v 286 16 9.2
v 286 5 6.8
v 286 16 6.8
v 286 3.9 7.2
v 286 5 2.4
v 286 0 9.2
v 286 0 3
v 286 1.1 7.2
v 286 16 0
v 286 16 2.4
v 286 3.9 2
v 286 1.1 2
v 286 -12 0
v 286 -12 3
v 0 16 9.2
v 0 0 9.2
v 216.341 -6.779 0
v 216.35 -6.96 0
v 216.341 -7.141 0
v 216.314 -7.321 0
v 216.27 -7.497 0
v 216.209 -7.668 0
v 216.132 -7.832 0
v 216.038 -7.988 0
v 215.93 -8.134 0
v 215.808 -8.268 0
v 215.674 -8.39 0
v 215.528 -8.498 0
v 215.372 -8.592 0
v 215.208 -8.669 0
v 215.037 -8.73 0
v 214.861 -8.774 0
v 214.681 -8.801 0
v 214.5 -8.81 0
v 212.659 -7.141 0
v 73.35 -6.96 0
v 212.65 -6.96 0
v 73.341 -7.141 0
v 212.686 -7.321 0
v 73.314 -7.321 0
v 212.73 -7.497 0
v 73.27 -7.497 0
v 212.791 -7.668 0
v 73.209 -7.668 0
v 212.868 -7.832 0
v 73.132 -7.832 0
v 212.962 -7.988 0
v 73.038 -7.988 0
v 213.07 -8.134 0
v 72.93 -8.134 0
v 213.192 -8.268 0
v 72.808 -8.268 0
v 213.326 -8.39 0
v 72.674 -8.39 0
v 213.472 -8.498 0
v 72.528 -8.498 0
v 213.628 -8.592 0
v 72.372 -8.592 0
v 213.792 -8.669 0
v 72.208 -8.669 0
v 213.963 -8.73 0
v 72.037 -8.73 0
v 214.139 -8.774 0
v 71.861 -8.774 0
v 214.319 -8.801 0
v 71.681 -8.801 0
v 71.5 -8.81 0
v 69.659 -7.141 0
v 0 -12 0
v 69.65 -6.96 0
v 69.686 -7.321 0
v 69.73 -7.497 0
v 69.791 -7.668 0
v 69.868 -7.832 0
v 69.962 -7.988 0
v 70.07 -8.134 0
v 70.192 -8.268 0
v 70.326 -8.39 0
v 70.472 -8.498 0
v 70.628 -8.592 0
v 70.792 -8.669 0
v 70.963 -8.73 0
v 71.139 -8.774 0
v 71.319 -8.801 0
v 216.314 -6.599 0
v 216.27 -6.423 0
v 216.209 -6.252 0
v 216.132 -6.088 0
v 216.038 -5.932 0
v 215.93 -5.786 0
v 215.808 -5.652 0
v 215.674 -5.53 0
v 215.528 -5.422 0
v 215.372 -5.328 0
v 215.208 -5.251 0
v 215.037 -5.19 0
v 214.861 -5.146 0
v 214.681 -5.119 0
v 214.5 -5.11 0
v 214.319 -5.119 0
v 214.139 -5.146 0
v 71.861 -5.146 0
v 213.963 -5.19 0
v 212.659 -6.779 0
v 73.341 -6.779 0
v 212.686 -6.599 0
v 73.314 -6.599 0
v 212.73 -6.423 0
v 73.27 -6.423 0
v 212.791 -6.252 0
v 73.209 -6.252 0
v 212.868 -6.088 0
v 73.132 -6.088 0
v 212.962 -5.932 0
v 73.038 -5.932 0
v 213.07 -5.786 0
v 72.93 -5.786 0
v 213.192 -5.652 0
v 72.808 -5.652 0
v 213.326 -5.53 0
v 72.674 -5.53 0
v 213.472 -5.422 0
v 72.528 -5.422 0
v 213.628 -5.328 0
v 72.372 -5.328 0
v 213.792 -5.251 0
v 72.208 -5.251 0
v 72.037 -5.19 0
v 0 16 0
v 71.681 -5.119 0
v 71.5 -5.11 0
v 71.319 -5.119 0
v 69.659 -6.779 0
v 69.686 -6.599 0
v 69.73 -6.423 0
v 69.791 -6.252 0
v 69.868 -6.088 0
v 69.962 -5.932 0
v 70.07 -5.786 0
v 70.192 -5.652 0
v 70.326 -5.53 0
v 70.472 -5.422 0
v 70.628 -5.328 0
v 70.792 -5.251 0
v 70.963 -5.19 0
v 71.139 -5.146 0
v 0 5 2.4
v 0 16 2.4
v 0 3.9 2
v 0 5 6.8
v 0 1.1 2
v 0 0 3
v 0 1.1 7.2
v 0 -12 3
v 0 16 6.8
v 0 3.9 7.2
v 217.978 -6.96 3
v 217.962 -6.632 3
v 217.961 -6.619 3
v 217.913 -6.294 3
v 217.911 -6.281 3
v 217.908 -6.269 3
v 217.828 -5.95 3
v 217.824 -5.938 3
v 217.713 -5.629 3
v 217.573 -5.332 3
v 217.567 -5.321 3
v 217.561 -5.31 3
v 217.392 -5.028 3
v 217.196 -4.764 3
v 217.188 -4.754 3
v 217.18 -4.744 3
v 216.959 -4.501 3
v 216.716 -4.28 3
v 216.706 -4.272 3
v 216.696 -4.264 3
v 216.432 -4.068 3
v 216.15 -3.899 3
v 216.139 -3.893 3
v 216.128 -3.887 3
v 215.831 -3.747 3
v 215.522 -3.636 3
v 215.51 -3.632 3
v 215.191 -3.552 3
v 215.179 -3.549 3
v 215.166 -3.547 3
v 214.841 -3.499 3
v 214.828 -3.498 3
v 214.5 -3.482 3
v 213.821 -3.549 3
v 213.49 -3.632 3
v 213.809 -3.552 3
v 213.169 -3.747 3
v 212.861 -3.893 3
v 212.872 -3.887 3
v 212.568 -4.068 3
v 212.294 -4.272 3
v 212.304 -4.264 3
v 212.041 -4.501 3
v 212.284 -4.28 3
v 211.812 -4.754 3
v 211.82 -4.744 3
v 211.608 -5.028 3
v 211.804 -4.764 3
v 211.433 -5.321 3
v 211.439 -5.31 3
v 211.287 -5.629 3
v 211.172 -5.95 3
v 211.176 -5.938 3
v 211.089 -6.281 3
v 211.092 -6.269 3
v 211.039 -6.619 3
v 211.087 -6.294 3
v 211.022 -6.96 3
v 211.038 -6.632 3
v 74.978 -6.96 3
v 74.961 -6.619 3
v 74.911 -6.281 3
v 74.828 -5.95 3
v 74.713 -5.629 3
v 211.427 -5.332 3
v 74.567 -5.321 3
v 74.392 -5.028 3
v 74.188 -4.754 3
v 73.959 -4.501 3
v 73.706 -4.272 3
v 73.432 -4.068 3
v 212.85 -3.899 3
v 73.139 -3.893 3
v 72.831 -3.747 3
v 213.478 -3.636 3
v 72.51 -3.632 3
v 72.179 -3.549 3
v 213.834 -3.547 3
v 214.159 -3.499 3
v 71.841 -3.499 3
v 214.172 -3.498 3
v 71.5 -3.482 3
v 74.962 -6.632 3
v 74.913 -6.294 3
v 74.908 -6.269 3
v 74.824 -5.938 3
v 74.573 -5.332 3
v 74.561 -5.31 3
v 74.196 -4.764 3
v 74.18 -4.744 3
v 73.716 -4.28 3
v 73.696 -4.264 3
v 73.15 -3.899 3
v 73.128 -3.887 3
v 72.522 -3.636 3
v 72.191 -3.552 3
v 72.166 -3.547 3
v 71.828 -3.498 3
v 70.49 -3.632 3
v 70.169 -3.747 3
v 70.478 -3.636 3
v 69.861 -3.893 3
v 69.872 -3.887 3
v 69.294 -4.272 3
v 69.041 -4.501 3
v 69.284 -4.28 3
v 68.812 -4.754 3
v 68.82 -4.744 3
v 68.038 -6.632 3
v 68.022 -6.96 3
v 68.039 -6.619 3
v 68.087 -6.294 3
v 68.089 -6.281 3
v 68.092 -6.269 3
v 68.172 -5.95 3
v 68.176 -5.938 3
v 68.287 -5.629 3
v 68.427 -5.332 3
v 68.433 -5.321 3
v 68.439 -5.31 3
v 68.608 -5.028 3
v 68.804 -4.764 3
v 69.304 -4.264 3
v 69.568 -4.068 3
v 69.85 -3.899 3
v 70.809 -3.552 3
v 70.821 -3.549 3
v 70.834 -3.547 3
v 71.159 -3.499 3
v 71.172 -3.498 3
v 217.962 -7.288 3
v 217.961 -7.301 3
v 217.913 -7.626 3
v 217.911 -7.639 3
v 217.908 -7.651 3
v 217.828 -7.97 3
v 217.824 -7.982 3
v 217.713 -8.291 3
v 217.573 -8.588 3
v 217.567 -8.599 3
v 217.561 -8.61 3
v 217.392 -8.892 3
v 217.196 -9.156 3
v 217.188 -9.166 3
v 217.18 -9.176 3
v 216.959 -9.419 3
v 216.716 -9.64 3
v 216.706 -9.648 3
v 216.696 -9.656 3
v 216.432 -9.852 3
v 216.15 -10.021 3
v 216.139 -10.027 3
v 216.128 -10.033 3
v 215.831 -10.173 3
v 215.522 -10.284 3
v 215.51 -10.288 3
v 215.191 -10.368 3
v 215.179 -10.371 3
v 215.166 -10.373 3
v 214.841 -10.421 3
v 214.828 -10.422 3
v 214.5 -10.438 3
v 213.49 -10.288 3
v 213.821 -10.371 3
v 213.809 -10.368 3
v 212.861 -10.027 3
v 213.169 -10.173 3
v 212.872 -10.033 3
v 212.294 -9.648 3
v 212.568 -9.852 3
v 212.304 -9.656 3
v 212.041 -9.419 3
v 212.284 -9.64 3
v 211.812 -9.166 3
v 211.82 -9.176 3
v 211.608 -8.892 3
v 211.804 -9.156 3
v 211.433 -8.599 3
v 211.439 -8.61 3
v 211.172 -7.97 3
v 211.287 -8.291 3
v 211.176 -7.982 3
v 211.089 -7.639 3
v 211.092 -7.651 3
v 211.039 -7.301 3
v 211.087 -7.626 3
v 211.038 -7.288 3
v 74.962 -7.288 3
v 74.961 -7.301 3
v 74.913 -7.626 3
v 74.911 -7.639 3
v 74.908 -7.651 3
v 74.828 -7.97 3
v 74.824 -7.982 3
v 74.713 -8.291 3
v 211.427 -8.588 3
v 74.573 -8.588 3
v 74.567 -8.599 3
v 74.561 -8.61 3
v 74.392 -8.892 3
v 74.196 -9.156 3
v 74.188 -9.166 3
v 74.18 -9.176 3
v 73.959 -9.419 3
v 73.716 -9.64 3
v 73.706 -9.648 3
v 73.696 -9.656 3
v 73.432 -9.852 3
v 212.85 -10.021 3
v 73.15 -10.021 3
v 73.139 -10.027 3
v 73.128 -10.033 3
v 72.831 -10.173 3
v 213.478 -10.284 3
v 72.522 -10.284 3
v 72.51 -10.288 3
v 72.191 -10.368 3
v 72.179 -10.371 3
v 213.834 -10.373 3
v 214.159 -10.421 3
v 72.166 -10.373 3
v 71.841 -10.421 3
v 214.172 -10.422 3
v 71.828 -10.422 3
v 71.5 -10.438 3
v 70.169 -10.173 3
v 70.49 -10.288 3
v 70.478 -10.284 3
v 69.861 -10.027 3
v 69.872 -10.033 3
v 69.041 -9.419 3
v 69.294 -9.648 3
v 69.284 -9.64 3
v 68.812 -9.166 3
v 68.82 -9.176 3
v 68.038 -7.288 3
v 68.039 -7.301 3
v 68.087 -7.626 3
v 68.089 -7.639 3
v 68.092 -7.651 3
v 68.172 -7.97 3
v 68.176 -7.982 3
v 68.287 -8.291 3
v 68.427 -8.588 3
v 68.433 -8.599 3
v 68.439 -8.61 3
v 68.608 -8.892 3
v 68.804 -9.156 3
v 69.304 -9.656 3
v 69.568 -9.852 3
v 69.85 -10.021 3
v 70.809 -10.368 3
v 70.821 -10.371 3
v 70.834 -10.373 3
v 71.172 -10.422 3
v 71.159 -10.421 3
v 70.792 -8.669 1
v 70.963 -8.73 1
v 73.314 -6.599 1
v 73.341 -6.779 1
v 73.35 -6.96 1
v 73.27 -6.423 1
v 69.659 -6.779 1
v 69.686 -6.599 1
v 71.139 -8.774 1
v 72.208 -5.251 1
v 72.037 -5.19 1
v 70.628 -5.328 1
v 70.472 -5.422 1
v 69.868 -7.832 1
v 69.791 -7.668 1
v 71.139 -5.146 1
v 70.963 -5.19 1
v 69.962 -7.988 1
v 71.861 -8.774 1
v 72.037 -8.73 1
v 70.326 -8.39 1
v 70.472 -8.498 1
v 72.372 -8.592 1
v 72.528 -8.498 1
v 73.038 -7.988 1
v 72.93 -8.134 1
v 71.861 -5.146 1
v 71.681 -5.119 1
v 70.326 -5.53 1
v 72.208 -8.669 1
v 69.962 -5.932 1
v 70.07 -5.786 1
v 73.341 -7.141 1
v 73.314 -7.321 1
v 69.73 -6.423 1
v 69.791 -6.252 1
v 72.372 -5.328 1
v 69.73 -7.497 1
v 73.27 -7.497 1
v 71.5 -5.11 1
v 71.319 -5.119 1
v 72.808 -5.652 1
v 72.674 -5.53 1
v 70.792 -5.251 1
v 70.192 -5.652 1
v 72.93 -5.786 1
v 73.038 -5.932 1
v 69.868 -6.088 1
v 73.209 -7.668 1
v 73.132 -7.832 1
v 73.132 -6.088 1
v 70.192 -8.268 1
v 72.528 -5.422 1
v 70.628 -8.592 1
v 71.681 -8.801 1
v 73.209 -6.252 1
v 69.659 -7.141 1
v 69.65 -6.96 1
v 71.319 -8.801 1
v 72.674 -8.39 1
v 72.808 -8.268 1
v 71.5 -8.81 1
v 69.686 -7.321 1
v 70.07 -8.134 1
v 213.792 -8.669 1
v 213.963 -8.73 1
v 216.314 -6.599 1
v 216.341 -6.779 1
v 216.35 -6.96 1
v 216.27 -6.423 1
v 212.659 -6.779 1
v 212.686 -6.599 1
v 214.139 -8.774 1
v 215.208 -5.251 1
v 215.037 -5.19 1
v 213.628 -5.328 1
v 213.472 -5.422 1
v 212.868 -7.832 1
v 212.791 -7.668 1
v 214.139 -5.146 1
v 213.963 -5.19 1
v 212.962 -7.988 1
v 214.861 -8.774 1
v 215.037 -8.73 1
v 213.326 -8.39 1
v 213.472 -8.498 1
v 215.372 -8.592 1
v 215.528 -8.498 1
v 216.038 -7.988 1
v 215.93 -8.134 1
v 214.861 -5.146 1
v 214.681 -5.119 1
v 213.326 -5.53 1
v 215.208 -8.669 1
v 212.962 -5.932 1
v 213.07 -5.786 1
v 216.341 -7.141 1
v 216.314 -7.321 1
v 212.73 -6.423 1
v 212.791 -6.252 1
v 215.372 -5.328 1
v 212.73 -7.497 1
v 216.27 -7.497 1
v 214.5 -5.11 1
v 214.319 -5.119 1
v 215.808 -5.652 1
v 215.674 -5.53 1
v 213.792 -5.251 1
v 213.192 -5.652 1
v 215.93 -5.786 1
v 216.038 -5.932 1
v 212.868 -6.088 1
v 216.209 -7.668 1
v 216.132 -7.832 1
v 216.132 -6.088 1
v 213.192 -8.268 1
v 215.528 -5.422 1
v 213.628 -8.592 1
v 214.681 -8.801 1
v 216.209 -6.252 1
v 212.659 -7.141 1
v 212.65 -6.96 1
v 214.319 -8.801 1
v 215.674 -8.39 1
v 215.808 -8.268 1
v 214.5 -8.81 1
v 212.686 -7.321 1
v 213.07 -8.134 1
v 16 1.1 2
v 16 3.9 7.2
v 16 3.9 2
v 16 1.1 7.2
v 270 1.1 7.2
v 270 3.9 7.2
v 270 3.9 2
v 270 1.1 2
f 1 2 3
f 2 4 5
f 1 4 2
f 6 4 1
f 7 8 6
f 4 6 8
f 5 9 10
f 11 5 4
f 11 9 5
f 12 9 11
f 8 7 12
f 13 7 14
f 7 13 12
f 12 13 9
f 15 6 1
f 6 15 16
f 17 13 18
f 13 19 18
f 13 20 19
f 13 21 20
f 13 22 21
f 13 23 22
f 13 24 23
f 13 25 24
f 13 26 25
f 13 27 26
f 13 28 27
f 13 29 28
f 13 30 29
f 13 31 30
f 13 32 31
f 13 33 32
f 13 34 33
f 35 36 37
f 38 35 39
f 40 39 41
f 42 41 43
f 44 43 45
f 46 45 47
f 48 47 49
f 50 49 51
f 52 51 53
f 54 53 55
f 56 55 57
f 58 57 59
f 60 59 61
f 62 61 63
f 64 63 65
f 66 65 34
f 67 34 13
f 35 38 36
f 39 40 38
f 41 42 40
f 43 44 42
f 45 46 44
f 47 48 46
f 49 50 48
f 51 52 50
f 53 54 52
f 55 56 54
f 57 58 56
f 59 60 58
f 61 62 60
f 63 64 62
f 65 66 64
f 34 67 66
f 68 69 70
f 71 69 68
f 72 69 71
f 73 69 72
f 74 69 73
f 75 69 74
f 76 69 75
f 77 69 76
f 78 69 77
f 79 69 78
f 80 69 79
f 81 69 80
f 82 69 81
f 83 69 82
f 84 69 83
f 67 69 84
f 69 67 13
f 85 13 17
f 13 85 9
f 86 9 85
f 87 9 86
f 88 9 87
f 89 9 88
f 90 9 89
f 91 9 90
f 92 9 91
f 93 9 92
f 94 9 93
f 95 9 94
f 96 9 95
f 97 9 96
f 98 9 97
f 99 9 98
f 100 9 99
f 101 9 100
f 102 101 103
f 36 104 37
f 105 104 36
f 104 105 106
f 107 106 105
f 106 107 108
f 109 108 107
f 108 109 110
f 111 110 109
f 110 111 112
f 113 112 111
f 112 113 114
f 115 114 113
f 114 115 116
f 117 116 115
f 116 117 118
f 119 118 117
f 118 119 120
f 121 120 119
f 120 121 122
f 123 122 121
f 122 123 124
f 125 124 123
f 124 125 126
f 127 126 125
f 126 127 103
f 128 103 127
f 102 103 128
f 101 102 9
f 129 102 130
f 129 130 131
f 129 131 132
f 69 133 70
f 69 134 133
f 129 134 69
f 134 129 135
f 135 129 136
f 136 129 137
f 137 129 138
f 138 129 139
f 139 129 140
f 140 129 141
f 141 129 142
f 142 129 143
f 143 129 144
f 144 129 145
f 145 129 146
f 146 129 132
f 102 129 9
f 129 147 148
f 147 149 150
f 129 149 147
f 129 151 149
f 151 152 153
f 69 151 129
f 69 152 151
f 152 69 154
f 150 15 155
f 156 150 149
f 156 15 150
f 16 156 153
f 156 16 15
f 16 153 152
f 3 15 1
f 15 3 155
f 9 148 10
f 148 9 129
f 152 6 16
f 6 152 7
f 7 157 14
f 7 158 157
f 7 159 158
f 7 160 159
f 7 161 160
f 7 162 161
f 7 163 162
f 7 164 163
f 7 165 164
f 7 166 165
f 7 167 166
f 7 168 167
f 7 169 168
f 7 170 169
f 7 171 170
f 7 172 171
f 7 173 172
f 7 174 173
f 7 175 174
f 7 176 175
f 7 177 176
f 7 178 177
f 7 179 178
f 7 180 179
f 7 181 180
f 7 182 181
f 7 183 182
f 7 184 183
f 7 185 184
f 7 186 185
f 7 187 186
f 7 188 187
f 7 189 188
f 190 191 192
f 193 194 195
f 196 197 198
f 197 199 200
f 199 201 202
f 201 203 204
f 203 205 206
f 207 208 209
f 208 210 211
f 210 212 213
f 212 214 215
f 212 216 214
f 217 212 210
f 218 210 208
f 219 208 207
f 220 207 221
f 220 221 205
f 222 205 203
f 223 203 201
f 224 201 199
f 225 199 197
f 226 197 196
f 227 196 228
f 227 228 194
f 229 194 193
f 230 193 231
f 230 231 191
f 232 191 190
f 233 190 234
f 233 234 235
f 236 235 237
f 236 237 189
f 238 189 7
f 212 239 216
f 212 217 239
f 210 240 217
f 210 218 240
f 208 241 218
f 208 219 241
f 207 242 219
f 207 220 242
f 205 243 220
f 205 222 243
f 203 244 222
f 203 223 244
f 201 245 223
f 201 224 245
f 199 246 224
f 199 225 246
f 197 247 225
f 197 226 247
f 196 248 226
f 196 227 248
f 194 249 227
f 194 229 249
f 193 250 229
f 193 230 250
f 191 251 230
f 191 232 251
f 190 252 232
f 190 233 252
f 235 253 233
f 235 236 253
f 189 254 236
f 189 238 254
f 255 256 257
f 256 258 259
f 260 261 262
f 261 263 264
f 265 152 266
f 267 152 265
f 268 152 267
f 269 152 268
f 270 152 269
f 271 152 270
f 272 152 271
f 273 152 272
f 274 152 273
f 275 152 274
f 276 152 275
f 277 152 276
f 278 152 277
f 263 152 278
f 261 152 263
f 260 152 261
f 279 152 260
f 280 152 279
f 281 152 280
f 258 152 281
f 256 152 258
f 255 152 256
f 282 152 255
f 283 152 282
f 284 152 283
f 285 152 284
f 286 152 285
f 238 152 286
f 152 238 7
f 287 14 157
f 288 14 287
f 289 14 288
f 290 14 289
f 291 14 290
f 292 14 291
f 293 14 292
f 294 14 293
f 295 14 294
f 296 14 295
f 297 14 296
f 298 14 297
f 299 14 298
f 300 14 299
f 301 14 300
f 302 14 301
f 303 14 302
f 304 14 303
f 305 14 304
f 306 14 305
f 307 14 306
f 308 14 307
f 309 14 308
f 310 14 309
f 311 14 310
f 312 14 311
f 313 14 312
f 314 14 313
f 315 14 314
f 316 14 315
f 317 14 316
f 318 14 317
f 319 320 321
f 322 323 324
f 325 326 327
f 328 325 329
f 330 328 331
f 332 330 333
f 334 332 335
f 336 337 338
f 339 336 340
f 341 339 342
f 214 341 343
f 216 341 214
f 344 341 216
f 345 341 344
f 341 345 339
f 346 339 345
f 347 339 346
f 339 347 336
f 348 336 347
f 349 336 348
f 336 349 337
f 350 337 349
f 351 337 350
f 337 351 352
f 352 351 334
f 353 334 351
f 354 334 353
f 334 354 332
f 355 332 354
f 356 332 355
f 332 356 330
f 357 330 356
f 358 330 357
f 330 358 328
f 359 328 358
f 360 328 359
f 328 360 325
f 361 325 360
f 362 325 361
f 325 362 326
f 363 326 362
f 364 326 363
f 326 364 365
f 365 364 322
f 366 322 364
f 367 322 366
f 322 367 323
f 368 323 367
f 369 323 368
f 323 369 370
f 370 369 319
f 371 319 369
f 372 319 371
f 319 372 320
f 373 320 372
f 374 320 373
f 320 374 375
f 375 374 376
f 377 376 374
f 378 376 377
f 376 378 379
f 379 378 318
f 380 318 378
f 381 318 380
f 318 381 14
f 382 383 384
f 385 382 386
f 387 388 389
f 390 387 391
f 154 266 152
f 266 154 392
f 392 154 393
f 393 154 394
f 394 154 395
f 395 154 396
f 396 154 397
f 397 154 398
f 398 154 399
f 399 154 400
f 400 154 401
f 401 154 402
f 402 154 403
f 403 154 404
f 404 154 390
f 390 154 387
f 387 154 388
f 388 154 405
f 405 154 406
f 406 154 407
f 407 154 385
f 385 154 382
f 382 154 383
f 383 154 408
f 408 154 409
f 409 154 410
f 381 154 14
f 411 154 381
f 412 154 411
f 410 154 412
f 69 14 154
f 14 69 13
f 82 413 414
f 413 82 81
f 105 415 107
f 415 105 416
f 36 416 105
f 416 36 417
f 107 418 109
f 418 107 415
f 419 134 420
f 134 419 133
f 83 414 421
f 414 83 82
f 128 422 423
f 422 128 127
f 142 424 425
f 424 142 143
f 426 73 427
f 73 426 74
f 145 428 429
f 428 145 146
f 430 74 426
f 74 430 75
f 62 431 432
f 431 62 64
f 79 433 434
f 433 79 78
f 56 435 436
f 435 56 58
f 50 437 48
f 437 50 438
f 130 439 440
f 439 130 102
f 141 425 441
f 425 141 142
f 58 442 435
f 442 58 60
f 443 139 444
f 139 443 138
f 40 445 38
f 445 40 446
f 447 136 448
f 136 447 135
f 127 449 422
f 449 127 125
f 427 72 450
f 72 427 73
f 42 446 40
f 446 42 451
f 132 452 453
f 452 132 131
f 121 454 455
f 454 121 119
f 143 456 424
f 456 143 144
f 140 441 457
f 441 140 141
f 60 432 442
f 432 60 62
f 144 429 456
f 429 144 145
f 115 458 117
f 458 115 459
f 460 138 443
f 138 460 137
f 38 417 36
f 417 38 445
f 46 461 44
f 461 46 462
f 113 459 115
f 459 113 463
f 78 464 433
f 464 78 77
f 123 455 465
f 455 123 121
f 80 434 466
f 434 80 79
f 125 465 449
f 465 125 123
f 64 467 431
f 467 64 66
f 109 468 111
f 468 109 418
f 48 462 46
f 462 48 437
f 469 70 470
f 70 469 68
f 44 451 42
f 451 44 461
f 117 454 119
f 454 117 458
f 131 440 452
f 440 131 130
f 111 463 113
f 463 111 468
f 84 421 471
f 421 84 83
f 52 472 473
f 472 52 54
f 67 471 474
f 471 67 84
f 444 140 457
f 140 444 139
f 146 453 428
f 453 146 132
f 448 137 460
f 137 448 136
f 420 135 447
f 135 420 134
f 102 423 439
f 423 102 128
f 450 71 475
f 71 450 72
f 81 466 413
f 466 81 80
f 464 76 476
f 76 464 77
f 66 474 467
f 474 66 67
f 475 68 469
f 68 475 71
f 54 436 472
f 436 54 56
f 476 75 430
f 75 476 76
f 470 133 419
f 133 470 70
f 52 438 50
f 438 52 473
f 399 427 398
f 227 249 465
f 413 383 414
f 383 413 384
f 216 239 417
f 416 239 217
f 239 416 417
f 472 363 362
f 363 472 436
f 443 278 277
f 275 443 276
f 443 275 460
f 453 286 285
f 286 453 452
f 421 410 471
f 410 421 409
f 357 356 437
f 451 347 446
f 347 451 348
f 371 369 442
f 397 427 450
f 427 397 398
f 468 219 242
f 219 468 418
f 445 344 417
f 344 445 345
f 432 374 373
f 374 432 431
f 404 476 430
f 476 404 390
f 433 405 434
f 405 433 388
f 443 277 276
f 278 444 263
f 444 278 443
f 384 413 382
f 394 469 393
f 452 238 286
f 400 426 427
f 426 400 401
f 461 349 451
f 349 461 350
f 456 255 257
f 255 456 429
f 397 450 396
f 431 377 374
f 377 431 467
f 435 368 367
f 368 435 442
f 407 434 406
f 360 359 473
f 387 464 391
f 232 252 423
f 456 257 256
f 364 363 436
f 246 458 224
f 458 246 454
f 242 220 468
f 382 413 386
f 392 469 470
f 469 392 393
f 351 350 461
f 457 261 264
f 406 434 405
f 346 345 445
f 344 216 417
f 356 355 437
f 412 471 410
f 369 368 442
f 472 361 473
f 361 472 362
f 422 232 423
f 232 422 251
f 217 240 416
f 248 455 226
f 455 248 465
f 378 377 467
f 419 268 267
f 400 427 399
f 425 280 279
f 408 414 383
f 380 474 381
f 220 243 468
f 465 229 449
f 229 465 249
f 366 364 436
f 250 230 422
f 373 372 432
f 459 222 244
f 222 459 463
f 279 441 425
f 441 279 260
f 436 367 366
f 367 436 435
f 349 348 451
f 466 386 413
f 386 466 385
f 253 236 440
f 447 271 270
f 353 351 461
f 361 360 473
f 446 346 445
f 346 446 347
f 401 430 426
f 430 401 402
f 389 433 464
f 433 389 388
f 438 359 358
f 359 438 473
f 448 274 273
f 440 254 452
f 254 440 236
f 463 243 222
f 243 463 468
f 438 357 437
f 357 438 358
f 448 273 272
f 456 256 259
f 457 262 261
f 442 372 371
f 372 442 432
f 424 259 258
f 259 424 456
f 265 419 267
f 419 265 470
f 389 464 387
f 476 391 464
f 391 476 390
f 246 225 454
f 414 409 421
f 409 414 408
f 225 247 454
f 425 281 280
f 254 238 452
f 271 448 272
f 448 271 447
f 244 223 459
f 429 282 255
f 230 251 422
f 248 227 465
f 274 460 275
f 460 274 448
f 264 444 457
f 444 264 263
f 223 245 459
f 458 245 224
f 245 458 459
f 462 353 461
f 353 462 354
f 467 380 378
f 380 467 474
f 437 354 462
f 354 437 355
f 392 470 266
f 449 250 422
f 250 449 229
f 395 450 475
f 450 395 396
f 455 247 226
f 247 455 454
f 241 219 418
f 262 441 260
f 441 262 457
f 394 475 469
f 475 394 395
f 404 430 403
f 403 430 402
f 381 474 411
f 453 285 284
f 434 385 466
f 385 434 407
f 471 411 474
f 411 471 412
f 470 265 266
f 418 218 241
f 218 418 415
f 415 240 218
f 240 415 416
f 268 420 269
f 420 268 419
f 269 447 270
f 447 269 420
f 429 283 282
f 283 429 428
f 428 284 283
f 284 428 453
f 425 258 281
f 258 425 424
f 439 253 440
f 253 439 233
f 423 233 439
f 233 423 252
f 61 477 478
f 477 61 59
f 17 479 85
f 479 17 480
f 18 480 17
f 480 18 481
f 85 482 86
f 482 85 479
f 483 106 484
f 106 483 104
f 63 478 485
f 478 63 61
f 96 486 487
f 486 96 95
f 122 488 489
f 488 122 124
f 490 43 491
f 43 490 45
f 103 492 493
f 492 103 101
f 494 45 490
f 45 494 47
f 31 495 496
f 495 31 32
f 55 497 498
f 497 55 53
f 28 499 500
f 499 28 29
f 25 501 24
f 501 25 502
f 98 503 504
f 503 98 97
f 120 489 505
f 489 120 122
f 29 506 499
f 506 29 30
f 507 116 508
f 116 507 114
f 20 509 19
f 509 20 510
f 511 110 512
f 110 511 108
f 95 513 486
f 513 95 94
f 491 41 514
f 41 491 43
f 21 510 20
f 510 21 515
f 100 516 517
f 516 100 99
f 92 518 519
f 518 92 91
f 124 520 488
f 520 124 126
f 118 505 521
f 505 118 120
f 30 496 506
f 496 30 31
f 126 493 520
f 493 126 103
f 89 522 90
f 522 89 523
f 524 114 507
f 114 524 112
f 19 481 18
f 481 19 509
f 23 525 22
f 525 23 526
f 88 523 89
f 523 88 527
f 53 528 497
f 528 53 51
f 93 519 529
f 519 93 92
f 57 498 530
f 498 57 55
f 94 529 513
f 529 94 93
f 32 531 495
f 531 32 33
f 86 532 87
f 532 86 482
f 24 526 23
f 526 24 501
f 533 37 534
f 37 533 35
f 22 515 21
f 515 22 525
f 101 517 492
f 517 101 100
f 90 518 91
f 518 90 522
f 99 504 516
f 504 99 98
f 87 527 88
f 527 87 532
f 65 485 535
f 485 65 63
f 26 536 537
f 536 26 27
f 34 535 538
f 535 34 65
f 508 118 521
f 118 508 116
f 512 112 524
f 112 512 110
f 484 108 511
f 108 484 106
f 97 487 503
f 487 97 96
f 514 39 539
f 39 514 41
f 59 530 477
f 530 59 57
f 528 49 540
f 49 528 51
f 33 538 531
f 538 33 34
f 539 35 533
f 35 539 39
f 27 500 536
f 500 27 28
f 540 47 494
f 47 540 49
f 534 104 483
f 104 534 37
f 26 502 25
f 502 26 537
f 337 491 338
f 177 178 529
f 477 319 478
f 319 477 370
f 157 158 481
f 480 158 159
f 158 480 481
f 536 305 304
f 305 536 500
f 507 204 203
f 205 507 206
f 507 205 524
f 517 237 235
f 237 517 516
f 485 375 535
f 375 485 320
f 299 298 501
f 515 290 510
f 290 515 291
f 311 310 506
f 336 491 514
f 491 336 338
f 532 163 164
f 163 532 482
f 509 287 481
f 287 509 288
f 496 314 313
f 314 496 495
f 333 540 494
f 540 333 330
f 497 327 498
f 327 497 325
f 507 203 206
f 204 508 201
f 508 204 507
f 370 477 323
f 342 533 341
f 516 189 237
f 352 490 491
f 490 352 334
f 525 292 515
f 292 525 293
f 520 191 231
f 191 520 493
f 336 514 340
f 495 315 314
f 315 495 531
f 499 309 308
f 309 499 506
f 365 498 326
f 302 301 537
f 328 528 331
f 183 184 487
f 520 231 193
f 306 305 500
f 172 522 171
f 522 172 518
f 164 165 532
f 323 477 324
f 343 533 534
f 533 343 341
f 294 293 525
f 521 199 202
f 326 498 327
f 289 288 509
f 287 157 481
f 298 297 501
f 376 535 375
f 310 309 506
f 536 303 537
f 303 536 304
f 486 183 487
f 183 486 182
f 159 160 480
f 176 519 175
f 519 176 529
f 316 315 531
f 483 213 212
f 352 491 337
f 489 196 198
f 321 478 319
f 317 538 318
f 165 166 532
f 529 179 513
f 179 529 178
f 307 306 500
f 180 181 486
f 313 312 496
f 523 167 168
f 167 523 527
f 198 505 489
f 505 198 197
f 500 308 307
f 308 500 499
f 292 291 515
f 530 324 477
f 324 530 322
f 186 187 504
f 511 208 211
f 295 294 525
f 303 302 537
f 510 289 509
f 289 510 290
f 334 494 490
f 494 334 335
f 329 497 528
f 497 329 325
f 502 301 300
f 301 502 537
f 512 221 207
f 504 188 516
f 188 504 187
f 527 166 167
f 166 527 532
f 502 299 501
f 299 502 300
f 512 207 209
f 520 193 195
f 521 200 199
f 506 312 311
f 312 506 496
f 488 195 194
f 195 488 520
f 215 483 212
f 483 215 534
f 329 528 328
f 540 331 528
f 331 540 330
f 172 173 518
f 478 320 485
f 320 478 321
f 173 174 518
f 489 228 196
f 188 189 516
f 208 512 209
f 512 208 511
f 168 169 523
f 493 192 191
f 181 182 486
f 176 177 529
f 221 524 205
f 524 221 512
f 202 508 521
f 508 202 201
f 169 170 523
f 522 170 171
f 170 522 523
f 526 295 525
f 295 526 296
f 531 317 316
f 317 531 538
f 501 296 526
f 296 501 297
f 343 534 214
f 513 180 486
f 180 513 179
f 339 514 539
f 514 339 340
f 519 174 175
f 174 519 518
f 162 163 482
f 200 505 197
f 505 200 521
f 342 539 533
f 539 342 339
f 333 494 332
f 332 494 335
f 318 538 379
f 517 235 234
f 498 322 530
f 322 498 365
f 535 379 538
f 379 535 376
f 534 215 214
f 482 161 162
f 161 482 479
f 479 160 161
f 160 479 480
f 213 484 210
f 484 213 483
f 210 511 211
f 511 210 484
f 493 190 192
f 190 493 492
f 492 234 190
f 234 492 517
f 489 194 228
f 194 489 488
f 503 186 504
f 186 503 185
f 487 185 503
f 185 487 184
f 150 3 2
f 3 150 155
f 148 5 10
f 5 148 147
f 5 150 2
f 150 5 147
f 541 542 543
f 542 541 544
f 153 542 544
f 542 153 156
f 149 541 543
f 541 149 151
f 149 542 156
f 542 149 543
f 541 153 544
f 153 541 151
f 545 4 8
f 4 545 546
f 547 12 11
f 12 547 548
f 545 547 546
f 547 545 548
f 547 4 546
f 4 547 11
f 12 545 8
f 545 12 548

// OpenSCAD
/*
 Anycubic Kobra 3 Max – parametric budget enclosure hardware
 Hybrid construction: 20x20 mm timber battens + 4 mm acrylic panels.
 Default outer dimensions: 900 x 1050 x 900 mm (W x D x H).
 License: CC BY 4.0.
*/

PART = is_undef(PART) ? "rail_286" : PART;
ENC_W = is_undef(ENC_W) ? 900 : ENC_W;
ENC_D = is_undef(ENC_D) ? 1050 : ENC_D;
ENC_H = is_undef(ENC_H) ? 900 : ENC_H;
BATTEN = is_undef(BATTEN) ? 20 : BATTEN;
GLASS = is_undef(GLASS) ? 4.0 : GLASS;
GLASS_CLEARANCE = is_undef(GLASS_CLEARANCE) ? 0.40 : GLASS_CLEARANCE;

RAIL_REACH = 16.0;
RAIL_BACK = 5.0;
RAIL_SLOT_DEPTH = RAIL_REACH - RAIL_BACK;
RAIL_WALL = 2.4;
RAIL_T = GLASS + GLASS_CLEARANCE + 2*RAIL_WALL;
RAIL_FLANGE = 12.0;
RAIL_FLANGE_T = 3.0;
PIN_CAVITY_W = 2.8;
PIN_CAVITY_H = 5.2;
PIN_DEPTH = 16.0;
EPS = 0.05;
$fn = 64;

module screw_hole_z(d=4.2,h=10) { translate([0,0,-EPS]) cylinder(d=d,h=h+2*EPS); }
module screw_hole_x(d=4.2,h=10) { rotate([0,90,0]) translate([0,0,-EPS]) cylinder(d=d,h=h+2*EPS); }
module screw_hole_y(d=4.2,h=10) { rotate([-90,0,0]) translate([0,0,-EPS]) cylinder(d=d,h=h+2*EPS); }

module capsule(length=44,width=16,height=5) {
  linear_extrude(height=height)
    hull() {
      translate([width/2,width/2]) circle(d=width);
      translate([length-width/2,width/2]) circle(d=width);
    }
}

// U-channel for an acrylic edge, screwed to a flat timber face.
// Print flat on the mounting flange. The acrylic slot opens toward +Y.
module acrylic_rail(length=286,holes=true) {
  difference() {
    union() {
      cube([length,RAIL_REACH,RAIL_T]);
      translate([0,-RAIL_FLANGE,0]) cube([length,RAIL_FLANGE+4,RAIL_FLANGE_T]);
    }
    translate([-EPS,RAIL_BACK,RAIL_WALL])
      cube([length+2*EPS,RAIL_SLOT_DEPTH+EPS,GLASS+GLASS_CLEARANCE]);

    // Short alignment cavities at both ends; no long unsupported tunnel.
    translate([-EPS,1.1,(RAIL_T-PIN_CAVITY_H)/2])
      cube([PIN_DEPTH+EPS,PIN_CAVITY_W,PIN_CAVITY_H]);
    translate([length-PIN_DEPTH,1.1,(RAIL_T-PIN_CAVITY_H)/2])
      cube([PIN_DEPTH+EPS,PIN_CAVITY_W,PIN_CAVITY_H]);

    if (holes) for (x=[length*0.25,length*0.75]) {
      translate([x,-RAIL_FLANGE*0.58,-EPS]) cylinder(d=3.7,h=RAIL_FLANGE_T+2*EPS);
      translate([x,-RAIL_FLANGE*0.58,1.0])
        cylinder(d1=3.7,d2=7.2,h=RAIL_FLANGE_T-0.9+EPS);
    }
  }
}

module rail_splice_pin(length=30) {
  pin_w=PIN_CAVITY_W-0.25;
  pin_h=PIN_CAVITY_H-0.25;
  hull() {
    translate([1.2,0,0]) cube([length-2.4,pin_w,pin_h]);
    translate([0.3,0.25,0.25]) cube([length-0.6,pin_w-0.5,pin_h-0.5]);
  }
}

module rail_end_stop() {
  union() {
    cube([2,RAIL_REACH,RAIL_T]);
    translate([2,1.225,(RAIL_T-(PIN_CAVITY_H-0.25))/2])
      cube([12,PIN_CAVITY_W-0.25,PIN_CAVITY_H-0.25]);
  }
}

// Exterior 3-way timber corner bracket; one geometry works at all 8 corners by rotation.
module corner_gusset_3way(size=55,t=4) {
  difference() {
    union() {
      cube([size,size,t]);
      cube([size,t,size]);
      cube([t,size,size]);
      cube([12,12,12]);
    }
    for (p=[[16,34],[34,16],[40,40]]) translate([p[0],p[1],0]) screw_hole_z(4.3,t);
    for (p=[[16,34],[34,16],[40,40]]) translate([p[0],0,p[1]]) screw_hole_y(4.3,t);
    for (p=[[16,34],[34,16],[40,40]]) translate([0,p[0],p[1]]) screw_hole_x(4.3,t);
  }
}

module flat_t_bracket(t=4) {
  difference() {
    linear_extrude(height=t) union() {
      translate([0,18]) square([100,24]);
      translate([38,0]) square([24,60]);
    }
    for (p=[[15,30],[30,30],[70,30],[85,30],[50,10],[50,50]])
      translate([p[0],p[1],0]) screw_hole_z(4.3,t);
  }
}

module base_anchor(t=4) {
  difference() {
    union() { cube([45,28,t]); cube([45,t,28]); cube([8,8,8]); }
    for (x=[12,33]) translate([x,15,0]) screw_hole_z(4.3,t);
    for (x=[12,33]) translate([x,0,15]) screw_hole_y(4.3,t);
  }
}

module turn_clip() {
  difference() {
    union() { capsule(44,16,5); translate([34,3,5]) cube([8,10,1.2]); }
    translate([8,8,0]) screw_hole_z(4.4,7);
  }
}

module turn_clip_spacer() {
  difference() { cylinder(d=15,h=5); translate([0,0,-EPS]) cylinder(d=4.4,h=5+2*EPS); }
}

module panel_knob() {
  difference() {
    union() {
      cylinder(d=28,h=4);
      translate([0,0,4]) cylinder(d1=16,d2=13,h=15);
      translate([0,0,19]) cylinder(d=32,h=8);
    }
    translate([0,0,-EPS]) cylinder(d=4.4,h=28+2*EPS);
    translate([0,0,22]) cylinder(d=8.2,h=6.2);
  }
}

module panel_retainer_clip() {
  difference() {
    union() { cube([30,18,4]); translate([20,0,4]) cube([10,18,GLASS+1]); }
    translate([8,9,0]) screw_hole_z(4.3,4);
  }
}


module front_panel_shelf() {
  // Support ledge for the heavy removable front acrylic panel.
  // Print with the shelf on the bed; install the tall plate against the lower front timber.
  difference() {
    union() {
      cube([50,14,4]);          // horizontal shelf
      cube([50,4,30]);          // mounting plate
      translate([0,11,0]) cube([50,3,9]); // retaining lip
    }
    for (x=[13,37])
      translate([x,0,19]) screw_hole_y(4.3,4);
  }
}

module service_panel_120_ports() {
  pw=280; ph=200; pt=3; cw=250; ch=170; lt=3; lw=3; fx=82; fy=100;
  difference() {
    union() {
      cube([pw,ph,pt]);
      translate([(pw-cw)/2,(ph-ch)/2,pt])
        difference() {
          cube([cw-0.6,ch-0.6,lt]);
          translate([lw,lw,-EPS]) cube([cw-0.6-2*lw,ch-0.6-2*lw,lt+2*EPS]);
        }
    }
    translate([fx,fy,-EPS]) cylinder(d=114,h=pt+lt+2*EPS,$fn=128);
    for (dx=[-52.5,52.5],dy=[-52.5,52.5])
      translate([fx+dx,fy+dy,-EPS]) cylinder(d=4.5,h=pt+lt+2*EPS);
    for (p=[[190,145],[225,145]])
      translate([p[0],p[1],-EPS]) cylinder(d=10.2,h=pt+lt+2*EPS);
    translate([255,145,-EPS]) cylinder(d=20.5,h=pt+lt+2*EPS);
    translate([210,60,-EPS]) cylinder(d=38,h=pt+lt+2*EPS,$fn=96);
    translate([255,70,-EPS]) cylinder(d=6.5,h=pt+lt+2*EPS);
    for (p=[[10,10],[140,10],[270,10],[10,190],[140,190],[270,190],[10,100],[270,100]])
      translate([p[0],p[1],-EPS]) cylinder(d=4.3,h=pt+lt+2*EPS);
  }
}

module service_panel_blank() {
  pw=280; ph=200; pt=3; cw=250; ch=170; lt=3; lw=3;
  difference() {
    union() {
      cube([pw,ph,pt]);
      translate([(pw-cw)/2,(ph-ch)/2,pt])
        difference() {
          cube([cw-0.6,ch-0.6,lt]);
          translate([lw,lw,-EPS]) cube([cw-0.6-2*lw,ch-0.6-2*lw,lt+2*EPS]);
        }
    }
    for (p=[[10,10],[140,10],[270,10],[10,190],[140,190],[270,190],[10,100],[270,100]])
      translate([p[0],p[1],-EPS]) cylinder(d=4.3,h=pt+lt+2*EPS);
  }
}

module fan_adapter_120_to_100() {
  flange=125; ft=3; cone_h=45; tube_h=30; wall=2.5;
  difference() {
    union() {
      translate([-flange/2,-flange/2,0]) cube([flange,flange,ft]);
      translate([0,0,ft]) cylinder(h=cone_h,d1=120,d2=100,$fn=128);
      translate([0,0,ft+cone_h]) cylinder(h=tube_h,d=100,$fn=128);
      translate([0,0,ft+cone_h+tube_h-8]) cylinder(h=2,d=102,$fn=128);
      translate([0,0,ft+cone_h+tube_h-3]) cylinder(h=2,d=102,$fn=128);
    }
    translate([0,0,-EPS]) cylinder(h=ft+EPS,d=114,$fn=128);
    translate([0,0,ft-EPS]) cylinder(h=cone_h+2*EPS,d1=114,d2=95,$fn=128);
    translate([0,0,ft+cone_h-EPS]) cylinder(h=tube_h+2*EPS,d=95,$fn=128);
    for (dx=[-52.5,52.5],dy=[-52.5,52.5])
      translate([dx,dy,-EPS]) cylinder(d=4.5,h=ft+2*EPS);
  }
}

module fan_guard_120() {
  t=3;
  difference() {
    union() {
      // Connected square perimeter with airflow bars.
      difference() { cube([120,120,t]); translate([6,6,-EPS]) cube([108,108,t+2*EPS]); }
      translate([6,57.8,0]) cube([108,4.4,t]);
      translate([57.8,6,0]) cube([4.4,108,t]);
      translate([20,20,0]) rotate([0,0,45]) cube([113,3.4,t]);
      translate([20,100,0]) rotate([0,0,-45]) cube([113,3.4,t]);
    }
    for (x=[7.5,112.5],y=[7.5,112.5]) translate([x,y,-EPS]) cylinder(d=4.5,h=t+2*EPS);
  }
}

module cable_grommet_half(side=1) {
  difference() {
    intersection() {
      union() { cylinder(d=46,h=3,$fn=96); translate([0,0,3]) cylinder(d=37.6,h=4,$fn=96); }
      if (side>0) translate([0,-30,-EPS]) cube([30,60,8]);
      else translate([-30,-30,-EPS]) cube([30,60,8]);
    }
    translate([0,0,-EPS]) cylinder(d=8.5,h=8.2,$fn=64);
  }
}

module rail_test_coupon() { acrylic_rail(50,false); }

if (PART=="rail_286") acrylic_rail(286,true);
else if (PART=="rail_143") acrylic_rail(143,true);
else if (PART=="rail_test_coupon") rail_test_coupon();
else if (PART=="rail_splice_pin") rail_splice_pin(30);
else if (PART=="rail_end_stop") translate([RAIL_T,0,0]) rotate([0,-90,0]) rail_end_stop();
else if (PART=="corner_gusset_3way") corner_gusset_3way();
else if (PART=="flat_t_bracket") flat_t_bracket();
else if (PART=="base_anchor") base_anchor();
else if (PART=="turn_clip") turn_clip();
else if (PART=="turn_clip_spacer") turn_clip_spacer();
else if (PART=="panel_knob") panel_knob();
else if (PART=="panel_retainer_clip") panel_retainer_clip();
else if (PART=="front_panel_shelf") front_panel_shelf();
else if (PART=="service_panel_120_ports") service_panel_120_ports();
else if (PART=="service_panel_blank") service_panel_blank();
else if (PART=="fan_adapter_120_to_100") fan_adapter_120_to_100();
else if (PART=="fan_guard_120") fan_guard_120();
else if (PART=="cable_grommet_half_A") cable_grommet_half(1);
else if (PART=="cable_grommet_half_B") cable_grommet_half(-1);
else rail_test_coupon();
